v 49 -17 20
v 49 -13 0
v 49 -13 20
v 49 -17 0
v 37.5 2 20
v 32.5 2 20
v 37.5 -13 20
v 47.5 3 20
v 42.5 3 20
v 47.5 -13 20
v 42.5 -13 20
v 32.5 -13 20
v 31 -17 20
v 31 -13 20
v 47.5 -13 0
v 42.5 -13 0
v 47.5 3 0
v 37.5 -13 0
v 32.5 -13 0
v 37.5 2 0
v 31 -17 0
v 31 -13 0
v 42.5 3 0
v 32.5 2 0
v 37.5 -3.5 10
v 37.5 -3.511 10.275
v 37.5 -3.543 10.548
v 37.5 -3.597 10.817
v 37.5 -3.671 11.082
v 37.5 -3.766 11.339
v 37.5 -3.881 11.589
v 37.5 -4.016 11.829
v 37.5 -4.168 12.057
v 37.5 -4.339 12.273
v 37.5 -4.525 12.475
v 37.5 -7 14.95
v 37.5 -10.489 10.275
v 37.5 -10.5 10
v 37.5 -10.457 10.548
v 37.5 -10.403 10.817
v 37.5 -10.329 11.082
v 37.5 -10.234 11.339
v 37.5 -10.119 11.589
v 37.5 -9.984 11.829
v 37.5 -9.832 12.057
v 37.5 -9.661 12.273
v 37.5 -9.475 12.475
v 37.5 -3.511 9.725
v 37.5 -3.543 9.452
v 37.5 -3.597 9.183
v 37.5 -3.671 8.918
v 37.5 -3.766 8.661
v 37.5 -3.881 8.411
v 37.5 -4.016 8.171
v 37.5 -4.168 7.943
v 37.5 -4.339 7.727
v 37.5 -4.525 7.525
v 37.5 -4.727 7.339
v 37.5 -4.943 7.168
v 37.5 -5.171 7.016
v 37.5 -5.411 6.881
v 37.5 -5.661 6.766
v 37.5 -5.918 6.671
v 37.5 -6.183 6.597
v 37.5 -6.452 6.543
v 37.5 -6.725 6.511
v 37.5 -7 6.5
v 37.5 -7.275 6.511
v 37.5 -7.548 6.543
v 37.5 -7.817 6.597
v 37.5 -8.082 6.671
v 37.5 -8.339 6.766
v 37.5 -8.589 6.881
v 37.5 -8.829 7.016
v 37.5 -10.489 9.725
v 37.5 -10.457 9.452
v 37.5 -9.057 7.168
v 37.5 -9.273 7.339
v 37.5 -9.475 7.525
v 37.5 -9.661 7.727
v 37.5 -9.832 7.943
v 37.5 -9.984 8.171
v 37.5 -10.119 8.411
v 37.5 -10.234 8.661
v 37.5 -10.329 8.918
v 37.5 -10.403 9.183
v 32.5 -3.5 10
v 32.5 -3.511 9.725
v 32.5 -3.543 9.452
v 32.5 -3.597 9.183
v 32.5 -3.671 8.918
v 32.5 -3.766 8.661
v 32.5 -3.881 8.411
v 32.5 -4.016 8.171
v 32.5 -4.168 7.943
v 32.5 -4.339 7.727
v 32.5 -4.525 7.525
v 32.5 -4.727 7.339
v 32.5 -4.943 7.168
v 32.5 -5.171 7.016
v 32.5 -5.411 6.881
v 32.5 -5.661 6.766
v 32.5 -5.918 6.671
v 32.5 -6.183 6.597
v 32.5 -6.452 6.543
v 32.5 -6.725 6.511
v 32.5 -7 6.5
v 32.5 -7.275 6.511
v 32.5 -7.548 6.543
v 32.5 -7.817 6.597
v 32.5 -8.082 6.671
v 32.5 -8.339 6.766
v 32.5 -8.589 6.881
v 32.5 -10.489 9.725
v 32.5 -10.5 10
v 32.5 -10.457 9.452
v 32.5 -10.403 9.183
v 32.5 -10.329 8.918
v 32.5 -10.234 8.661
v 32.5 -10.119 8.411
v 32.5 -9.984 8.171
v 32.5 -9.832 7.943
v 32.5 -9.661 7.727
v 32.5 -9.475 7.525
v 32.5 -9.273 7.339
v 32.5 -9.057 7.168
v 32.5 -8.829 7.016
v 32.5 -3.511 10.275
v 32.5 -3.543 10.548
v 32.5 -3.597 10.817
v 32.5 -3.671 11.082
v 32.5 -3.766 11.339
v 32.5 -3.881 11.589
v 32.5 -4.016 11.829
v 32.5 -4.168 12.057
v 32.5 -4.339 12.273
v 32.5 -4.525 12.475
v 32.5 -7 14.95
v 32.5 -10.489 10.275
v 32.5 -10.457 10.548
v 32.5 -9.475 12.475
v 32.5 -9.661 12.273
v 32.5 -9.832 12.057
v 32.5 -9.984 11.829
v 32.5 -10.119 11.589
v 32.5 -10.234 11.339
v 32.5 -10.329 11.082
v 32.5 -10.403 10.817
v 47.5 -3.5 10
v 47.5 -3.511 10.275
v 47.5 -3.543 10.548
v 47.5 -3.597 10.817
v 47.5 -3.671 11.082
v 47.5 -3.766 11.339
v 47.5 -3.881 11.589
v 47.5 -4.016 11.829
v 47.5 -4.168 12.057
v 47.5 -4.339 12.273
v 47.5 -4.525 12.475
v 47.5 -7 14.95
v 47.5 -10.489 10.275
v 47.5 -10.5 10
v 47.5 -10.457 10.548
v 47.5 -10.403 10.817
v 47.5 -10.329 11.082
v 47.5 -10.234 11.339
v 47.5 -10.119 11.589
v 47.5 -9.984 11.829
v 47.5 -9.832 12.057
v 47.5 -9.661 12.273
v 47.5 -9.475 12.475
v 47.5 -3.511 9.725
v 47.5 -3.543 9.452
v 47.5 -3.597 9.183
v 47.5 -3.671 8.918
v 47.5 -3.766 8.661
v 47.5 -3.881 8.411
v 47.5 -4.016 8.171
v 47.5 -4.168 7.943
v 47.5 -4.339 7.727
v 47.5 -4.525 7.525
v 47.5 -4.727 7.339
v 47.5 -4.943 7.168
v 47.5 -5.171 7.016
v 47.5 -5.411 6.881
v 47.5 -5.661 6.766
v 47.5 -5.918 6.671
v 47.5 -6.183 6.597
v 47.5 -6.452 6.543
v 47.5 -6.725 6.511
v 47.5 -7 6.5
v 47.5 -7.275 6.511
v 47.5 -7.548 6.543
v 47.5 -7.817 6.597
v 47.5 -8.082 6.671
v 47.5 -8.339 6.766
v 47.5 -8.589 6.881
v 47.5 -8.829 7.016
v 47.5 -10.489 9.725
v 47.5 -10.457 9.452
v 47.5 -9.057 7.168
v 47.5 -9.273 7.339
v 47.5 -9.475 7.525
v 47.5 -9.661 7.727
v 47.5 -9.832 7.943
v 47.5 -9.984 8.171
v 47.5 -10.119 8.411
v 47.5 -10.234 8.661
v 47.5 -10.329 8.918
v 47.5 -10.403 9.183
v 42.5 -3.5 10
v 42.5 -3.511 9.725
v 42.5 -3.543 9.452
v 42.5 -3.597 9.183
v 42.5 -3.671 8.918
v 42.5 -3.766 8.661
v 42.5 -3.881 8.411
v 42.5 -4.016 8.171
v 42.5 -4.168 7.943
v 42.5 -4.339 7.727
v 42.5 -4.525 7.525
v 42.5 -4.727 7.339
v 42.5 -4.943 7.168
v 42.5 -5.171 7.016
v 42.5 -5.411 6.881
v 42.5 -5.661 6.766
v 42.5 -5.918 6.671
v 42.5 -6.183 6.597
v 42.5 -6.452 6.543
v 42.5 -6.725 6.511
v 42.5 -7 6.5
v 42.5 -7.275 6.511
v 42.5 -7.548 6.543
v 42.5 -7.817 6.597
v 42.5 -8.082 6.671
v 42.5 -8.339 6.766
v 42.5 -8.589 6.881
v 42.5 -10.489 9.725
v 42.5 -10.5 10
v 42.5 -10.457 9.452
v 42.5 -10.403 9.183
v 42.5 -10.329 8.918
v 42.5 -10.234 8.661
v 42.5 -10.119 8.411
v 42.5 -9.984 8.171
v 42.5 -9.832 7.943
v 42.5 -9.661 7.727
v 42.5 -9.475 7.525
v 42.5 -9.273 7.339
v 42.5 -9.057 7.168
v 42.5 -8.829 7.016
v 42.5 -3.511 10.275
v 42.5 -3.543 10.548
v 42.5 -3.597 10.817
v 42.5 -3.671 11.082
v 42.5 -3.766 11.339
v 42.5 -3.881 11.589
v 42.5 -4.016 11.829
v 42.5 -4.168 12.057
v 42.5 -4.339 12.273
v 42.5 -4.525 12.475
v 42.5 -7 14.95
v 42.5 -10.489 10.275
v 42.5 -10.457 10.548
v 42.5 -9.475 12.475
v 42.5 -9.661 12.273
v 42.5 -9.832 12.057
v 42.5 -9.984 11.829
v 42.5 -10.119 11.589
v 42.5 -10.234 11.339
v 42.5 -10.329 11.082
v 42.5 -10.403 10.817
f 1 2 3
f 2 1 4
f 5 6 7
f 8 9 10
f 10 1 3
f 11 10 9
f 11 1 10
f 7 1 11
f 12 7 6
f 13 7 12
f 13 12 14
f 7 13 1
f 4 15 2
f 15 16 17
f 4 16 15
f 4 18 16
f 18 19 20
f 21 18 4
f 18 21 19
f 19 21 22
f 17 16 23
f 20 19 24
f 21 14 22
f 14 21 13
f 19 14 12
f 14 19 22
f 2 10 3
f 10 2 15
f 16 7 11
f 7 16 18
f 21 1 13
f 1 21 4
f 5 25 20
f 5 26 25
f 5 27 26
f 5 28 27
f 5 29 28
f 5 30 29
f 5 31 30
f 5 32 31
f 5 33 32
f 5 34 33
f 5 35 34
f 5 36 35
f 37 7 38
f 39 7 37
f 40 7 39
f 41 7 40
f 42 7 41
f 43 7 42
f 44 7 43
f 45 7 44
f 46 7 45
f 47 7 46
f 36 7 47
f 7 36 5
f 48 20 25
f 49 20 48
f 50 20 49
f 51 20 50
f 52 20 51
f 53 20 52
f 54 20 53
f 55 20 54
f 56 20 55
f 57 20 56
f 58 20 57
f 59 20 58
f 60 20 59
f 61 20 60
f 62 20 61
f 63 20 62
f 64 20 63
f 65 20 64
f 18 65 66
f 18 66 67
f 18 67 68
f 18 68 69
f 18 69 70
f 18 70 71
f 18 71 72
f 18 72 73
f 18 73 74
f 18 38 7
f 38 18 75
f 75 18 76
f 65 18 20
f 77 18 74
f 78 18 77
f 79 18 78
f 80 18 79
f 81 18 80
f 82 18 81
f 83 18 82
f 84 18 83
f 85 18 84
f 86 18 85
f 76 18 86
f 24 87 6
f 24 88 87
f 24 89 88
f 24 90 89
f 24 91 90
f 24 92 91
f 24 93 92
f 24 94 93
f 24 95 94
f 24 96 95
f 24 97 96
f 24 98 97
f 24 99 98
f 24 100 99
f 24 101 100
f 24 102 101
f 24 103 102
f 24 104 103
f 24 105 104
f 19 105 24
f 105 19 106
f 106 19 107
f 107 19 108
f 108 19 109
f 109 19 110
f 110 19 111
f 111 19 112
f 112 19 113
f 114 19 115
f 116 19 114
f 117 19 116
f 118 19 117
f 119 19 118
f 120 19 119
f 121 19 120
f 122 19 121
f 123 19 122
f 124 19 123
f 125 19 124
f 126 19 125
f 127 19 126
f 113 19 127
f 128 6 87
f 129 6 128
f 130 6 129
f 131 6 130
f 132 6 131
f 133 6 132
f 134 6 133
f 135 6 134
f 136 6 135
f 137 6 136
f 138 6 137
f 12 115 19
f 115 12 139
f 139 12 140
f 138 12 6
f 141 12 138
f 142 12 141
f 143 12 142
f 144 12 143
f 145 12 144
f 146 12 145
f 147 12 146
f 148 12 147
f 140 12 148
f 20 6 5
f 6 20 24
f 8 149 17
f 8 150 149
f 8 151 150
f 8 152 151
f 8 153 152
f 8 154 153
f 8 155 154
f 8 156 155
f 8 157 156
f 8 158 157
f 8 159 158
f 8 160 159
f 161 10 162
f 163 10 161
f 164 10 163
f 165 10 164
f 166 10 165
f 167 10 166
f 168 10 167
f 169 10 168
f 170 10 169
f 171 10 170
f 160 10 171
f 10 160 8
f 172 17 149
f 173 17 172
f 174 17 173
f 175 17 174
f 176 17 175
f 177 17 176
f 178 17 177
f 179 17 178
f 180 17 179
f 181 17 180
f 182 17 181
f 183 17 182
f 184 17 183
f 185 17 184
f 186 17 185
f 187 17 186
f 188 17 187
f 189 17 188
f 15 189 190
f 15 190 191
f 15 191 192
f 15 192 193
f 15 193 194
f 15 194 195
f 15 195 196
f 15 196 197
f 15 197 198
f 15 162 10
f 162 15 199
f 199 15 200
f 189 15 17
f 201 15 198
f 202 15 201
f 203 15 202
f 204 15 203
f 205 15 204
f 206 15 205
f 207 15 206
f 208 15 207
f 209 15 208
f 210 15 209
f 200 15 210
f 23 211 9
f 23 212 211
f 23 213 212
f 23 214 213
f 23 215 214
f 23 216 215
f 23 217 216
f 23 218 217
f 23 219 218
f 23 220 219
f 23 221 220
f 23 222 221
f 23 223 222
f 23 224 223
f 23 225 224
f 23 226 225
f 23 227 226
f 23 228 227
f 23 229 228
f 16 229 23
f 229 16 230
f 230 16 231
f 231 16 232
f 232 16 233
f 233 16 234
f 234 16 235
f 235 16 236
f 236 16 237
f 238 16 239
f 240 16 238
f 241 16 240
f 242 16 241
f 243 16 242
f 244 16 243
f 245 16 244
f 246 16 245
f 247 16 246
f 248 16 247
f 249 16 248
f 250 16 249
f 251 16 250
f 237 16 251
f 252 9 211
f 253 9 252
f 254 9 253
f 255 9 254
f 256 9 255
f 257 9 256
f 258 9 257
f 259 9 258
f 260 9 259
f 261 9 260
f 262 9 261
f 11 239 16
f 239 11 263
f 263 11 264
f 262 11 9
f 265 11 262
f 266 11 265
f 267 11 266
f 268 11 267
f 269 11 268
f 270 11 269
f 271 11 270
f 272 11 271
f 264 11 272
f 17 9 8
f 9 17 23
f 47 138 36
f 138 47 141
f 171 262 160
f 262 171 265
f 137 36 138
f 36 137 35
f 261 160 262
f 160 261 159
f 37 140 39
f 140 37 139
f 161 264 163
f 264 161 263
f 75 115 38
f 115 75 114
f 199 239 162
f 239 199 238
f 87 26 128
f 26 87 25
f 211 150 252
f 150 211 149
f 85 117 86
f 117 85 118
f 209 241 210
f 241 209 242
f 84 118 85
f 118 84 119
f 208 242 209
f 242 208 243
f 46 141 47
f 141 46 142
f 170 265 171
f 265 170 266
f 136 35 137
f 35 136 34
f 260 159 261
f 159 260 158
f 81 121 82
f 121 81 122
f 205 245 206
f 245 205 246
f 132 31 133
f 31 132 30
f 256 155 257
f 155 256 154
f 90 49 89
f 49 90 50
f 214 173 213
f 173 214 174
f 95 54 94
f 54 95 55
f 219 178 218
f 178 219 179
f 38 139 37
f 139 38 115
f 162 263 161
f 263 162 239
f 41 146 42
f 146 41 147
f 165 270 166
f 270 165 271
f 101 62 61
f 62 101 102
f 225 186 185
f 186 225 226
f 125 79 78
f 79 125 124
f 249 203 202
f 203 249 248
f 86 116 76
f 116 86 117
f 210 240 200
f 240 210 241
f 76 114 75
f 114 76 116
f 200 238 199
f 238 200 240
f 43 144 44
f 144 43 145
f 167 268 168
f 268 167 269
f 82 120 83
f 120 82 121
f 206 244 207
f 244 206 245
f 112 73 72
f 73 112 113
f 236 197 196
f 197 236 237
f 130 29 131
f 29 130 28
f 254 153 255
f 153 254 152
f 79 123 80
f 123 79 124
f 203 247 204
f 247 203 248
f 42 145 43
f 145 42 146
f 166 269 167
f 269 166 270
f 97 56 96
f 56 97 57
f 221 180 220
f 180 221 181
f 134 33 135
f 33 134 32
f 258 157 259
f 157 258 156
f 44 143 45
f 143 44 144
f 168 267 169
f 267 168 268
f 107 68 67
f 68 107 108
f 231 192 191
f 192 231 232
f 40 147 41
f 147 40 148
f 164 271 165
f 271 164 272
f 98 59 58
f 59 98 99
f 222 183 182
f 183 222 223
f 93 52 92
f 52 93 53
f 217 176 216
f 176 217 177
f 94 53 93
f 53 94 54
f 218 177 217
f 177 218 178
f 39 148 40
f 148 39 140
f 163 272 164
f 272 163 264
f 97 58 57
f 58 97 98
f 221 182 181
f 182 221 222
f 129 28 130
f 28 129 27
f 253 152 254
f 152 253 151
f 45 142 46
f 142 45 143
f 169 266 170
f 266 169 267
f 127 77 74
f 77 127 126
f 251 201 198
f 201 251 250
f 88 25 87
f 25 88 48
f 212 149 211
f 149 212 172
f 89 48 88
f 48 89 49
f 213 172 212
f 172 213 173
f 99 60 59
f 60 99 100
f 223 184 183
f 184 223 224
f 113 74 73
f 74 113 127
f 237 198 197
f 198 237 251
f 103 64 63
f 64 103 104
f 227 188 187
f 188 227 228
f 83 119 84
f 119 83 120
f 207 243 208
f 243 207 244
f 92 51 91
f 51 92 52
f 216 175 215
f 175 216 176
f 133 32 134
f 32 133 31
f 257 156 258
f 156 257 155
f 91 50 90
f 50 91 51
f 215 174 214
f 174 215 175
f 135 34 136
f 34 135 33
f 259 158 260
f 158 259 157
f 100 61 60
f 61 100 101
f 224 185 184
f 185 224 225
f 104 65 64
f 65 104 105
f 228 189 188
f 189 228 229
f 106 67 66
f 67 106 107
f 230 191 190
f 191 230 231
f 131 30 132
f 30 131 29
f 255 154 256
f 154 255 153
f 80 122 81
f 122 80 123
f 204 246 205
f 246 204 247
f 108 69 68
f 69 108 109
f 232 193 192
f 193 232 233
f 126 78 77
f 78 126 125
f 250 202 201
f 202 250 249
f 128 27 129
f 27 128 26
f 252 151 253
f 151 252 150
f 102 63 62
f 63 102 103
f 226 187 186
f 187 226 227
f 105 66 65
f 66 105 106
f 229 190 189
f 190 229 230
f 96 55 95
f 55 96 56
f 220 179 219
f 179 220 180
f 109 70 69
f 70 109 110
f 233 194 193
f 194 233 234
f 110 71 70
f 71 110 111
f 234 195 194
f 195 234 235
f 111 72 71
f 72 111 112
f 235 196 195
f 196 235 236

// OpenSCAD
// Parametric Frame Vertex by Tonokip
// 2009.02.08
// Vertex Body derived from: frame-vertex_6off.aoi::body - edges
// http://reprap.svn.sourceforge.net/viewvc/reprap/trunk/mendel/mechanics/solid-models/cartesian-robot-m4/printed-parts/
// Fixed body geometry flaw per http://dev.forums.reprap.org/read.php?1,30132,30398
// License GNU GPL v2 or newer.

M3=4.3; 
M8=9.6;
vertex_height=20;
with_foot=1;		// Comment out for no foot.

FN=80;

translate ([0,0,vertex_height/2])difference() 
{
	union () {
		dxf_linear_extrude(file = "vertex-body-fixed-qcad.dxf",height=vertex_height,center=true);
		//import_stl("vertex-body-fixed.stl");
		if (with_foot==1) {
			translate([40,-15,0]) vertex_foot();
		}
	}

	translate([11.013,59.912]) zhole(M8); 
	translate([35.013,39.999,0]) zhole(M8); 
	translate([40.274,9.249,0]) zhole(M8); 
	translate([40.217,30.992]) zhole(M3); 
	translate([29.829,48.986]) zhole(M3); 
	translate([0,21,0]) 
		xteardrop(M8,200);
	translate([13.687,41.010,0]) rotate(a=60,v=[0,0,1])
		xteardrop(M8,200);
}


module zhole(diameter) cylinder(h=100,r=(diameter/2),center=true,$fn=FN); 

module xteardrop(diameter,length) rotate(a=-90,v=[0,1,0]) rotate(a=-90,v=[0,0,1]) zteardrop(diameter,length);

module yteardrop(diameter,length) rotate(a=90,v=[1,0,0]) zteardrop(diameter,length);

module zteardrop(diameter,height)
{
	rotate(a=45, v=[0,0,1]) union()
	{
		translate([0,0,-height/2]) cube(size=[diameter/2,diameter/2,height],center=false);
		cylinder(r=diameter/2, h = height,center=true,$fn=FN);
	}
}

module vertex_foot() {
	difference () {
		union () {
			cube([18,4,vertex_height],center=true);
			translate ([-5,8,0]) cube([5,18,vertex_height],center=true);
			translate ([5,9,0]) cube([5,18,vertex_height],center=true);
		}
		translate ([0,8,0]) xteardrop(7,200);
	}
}
